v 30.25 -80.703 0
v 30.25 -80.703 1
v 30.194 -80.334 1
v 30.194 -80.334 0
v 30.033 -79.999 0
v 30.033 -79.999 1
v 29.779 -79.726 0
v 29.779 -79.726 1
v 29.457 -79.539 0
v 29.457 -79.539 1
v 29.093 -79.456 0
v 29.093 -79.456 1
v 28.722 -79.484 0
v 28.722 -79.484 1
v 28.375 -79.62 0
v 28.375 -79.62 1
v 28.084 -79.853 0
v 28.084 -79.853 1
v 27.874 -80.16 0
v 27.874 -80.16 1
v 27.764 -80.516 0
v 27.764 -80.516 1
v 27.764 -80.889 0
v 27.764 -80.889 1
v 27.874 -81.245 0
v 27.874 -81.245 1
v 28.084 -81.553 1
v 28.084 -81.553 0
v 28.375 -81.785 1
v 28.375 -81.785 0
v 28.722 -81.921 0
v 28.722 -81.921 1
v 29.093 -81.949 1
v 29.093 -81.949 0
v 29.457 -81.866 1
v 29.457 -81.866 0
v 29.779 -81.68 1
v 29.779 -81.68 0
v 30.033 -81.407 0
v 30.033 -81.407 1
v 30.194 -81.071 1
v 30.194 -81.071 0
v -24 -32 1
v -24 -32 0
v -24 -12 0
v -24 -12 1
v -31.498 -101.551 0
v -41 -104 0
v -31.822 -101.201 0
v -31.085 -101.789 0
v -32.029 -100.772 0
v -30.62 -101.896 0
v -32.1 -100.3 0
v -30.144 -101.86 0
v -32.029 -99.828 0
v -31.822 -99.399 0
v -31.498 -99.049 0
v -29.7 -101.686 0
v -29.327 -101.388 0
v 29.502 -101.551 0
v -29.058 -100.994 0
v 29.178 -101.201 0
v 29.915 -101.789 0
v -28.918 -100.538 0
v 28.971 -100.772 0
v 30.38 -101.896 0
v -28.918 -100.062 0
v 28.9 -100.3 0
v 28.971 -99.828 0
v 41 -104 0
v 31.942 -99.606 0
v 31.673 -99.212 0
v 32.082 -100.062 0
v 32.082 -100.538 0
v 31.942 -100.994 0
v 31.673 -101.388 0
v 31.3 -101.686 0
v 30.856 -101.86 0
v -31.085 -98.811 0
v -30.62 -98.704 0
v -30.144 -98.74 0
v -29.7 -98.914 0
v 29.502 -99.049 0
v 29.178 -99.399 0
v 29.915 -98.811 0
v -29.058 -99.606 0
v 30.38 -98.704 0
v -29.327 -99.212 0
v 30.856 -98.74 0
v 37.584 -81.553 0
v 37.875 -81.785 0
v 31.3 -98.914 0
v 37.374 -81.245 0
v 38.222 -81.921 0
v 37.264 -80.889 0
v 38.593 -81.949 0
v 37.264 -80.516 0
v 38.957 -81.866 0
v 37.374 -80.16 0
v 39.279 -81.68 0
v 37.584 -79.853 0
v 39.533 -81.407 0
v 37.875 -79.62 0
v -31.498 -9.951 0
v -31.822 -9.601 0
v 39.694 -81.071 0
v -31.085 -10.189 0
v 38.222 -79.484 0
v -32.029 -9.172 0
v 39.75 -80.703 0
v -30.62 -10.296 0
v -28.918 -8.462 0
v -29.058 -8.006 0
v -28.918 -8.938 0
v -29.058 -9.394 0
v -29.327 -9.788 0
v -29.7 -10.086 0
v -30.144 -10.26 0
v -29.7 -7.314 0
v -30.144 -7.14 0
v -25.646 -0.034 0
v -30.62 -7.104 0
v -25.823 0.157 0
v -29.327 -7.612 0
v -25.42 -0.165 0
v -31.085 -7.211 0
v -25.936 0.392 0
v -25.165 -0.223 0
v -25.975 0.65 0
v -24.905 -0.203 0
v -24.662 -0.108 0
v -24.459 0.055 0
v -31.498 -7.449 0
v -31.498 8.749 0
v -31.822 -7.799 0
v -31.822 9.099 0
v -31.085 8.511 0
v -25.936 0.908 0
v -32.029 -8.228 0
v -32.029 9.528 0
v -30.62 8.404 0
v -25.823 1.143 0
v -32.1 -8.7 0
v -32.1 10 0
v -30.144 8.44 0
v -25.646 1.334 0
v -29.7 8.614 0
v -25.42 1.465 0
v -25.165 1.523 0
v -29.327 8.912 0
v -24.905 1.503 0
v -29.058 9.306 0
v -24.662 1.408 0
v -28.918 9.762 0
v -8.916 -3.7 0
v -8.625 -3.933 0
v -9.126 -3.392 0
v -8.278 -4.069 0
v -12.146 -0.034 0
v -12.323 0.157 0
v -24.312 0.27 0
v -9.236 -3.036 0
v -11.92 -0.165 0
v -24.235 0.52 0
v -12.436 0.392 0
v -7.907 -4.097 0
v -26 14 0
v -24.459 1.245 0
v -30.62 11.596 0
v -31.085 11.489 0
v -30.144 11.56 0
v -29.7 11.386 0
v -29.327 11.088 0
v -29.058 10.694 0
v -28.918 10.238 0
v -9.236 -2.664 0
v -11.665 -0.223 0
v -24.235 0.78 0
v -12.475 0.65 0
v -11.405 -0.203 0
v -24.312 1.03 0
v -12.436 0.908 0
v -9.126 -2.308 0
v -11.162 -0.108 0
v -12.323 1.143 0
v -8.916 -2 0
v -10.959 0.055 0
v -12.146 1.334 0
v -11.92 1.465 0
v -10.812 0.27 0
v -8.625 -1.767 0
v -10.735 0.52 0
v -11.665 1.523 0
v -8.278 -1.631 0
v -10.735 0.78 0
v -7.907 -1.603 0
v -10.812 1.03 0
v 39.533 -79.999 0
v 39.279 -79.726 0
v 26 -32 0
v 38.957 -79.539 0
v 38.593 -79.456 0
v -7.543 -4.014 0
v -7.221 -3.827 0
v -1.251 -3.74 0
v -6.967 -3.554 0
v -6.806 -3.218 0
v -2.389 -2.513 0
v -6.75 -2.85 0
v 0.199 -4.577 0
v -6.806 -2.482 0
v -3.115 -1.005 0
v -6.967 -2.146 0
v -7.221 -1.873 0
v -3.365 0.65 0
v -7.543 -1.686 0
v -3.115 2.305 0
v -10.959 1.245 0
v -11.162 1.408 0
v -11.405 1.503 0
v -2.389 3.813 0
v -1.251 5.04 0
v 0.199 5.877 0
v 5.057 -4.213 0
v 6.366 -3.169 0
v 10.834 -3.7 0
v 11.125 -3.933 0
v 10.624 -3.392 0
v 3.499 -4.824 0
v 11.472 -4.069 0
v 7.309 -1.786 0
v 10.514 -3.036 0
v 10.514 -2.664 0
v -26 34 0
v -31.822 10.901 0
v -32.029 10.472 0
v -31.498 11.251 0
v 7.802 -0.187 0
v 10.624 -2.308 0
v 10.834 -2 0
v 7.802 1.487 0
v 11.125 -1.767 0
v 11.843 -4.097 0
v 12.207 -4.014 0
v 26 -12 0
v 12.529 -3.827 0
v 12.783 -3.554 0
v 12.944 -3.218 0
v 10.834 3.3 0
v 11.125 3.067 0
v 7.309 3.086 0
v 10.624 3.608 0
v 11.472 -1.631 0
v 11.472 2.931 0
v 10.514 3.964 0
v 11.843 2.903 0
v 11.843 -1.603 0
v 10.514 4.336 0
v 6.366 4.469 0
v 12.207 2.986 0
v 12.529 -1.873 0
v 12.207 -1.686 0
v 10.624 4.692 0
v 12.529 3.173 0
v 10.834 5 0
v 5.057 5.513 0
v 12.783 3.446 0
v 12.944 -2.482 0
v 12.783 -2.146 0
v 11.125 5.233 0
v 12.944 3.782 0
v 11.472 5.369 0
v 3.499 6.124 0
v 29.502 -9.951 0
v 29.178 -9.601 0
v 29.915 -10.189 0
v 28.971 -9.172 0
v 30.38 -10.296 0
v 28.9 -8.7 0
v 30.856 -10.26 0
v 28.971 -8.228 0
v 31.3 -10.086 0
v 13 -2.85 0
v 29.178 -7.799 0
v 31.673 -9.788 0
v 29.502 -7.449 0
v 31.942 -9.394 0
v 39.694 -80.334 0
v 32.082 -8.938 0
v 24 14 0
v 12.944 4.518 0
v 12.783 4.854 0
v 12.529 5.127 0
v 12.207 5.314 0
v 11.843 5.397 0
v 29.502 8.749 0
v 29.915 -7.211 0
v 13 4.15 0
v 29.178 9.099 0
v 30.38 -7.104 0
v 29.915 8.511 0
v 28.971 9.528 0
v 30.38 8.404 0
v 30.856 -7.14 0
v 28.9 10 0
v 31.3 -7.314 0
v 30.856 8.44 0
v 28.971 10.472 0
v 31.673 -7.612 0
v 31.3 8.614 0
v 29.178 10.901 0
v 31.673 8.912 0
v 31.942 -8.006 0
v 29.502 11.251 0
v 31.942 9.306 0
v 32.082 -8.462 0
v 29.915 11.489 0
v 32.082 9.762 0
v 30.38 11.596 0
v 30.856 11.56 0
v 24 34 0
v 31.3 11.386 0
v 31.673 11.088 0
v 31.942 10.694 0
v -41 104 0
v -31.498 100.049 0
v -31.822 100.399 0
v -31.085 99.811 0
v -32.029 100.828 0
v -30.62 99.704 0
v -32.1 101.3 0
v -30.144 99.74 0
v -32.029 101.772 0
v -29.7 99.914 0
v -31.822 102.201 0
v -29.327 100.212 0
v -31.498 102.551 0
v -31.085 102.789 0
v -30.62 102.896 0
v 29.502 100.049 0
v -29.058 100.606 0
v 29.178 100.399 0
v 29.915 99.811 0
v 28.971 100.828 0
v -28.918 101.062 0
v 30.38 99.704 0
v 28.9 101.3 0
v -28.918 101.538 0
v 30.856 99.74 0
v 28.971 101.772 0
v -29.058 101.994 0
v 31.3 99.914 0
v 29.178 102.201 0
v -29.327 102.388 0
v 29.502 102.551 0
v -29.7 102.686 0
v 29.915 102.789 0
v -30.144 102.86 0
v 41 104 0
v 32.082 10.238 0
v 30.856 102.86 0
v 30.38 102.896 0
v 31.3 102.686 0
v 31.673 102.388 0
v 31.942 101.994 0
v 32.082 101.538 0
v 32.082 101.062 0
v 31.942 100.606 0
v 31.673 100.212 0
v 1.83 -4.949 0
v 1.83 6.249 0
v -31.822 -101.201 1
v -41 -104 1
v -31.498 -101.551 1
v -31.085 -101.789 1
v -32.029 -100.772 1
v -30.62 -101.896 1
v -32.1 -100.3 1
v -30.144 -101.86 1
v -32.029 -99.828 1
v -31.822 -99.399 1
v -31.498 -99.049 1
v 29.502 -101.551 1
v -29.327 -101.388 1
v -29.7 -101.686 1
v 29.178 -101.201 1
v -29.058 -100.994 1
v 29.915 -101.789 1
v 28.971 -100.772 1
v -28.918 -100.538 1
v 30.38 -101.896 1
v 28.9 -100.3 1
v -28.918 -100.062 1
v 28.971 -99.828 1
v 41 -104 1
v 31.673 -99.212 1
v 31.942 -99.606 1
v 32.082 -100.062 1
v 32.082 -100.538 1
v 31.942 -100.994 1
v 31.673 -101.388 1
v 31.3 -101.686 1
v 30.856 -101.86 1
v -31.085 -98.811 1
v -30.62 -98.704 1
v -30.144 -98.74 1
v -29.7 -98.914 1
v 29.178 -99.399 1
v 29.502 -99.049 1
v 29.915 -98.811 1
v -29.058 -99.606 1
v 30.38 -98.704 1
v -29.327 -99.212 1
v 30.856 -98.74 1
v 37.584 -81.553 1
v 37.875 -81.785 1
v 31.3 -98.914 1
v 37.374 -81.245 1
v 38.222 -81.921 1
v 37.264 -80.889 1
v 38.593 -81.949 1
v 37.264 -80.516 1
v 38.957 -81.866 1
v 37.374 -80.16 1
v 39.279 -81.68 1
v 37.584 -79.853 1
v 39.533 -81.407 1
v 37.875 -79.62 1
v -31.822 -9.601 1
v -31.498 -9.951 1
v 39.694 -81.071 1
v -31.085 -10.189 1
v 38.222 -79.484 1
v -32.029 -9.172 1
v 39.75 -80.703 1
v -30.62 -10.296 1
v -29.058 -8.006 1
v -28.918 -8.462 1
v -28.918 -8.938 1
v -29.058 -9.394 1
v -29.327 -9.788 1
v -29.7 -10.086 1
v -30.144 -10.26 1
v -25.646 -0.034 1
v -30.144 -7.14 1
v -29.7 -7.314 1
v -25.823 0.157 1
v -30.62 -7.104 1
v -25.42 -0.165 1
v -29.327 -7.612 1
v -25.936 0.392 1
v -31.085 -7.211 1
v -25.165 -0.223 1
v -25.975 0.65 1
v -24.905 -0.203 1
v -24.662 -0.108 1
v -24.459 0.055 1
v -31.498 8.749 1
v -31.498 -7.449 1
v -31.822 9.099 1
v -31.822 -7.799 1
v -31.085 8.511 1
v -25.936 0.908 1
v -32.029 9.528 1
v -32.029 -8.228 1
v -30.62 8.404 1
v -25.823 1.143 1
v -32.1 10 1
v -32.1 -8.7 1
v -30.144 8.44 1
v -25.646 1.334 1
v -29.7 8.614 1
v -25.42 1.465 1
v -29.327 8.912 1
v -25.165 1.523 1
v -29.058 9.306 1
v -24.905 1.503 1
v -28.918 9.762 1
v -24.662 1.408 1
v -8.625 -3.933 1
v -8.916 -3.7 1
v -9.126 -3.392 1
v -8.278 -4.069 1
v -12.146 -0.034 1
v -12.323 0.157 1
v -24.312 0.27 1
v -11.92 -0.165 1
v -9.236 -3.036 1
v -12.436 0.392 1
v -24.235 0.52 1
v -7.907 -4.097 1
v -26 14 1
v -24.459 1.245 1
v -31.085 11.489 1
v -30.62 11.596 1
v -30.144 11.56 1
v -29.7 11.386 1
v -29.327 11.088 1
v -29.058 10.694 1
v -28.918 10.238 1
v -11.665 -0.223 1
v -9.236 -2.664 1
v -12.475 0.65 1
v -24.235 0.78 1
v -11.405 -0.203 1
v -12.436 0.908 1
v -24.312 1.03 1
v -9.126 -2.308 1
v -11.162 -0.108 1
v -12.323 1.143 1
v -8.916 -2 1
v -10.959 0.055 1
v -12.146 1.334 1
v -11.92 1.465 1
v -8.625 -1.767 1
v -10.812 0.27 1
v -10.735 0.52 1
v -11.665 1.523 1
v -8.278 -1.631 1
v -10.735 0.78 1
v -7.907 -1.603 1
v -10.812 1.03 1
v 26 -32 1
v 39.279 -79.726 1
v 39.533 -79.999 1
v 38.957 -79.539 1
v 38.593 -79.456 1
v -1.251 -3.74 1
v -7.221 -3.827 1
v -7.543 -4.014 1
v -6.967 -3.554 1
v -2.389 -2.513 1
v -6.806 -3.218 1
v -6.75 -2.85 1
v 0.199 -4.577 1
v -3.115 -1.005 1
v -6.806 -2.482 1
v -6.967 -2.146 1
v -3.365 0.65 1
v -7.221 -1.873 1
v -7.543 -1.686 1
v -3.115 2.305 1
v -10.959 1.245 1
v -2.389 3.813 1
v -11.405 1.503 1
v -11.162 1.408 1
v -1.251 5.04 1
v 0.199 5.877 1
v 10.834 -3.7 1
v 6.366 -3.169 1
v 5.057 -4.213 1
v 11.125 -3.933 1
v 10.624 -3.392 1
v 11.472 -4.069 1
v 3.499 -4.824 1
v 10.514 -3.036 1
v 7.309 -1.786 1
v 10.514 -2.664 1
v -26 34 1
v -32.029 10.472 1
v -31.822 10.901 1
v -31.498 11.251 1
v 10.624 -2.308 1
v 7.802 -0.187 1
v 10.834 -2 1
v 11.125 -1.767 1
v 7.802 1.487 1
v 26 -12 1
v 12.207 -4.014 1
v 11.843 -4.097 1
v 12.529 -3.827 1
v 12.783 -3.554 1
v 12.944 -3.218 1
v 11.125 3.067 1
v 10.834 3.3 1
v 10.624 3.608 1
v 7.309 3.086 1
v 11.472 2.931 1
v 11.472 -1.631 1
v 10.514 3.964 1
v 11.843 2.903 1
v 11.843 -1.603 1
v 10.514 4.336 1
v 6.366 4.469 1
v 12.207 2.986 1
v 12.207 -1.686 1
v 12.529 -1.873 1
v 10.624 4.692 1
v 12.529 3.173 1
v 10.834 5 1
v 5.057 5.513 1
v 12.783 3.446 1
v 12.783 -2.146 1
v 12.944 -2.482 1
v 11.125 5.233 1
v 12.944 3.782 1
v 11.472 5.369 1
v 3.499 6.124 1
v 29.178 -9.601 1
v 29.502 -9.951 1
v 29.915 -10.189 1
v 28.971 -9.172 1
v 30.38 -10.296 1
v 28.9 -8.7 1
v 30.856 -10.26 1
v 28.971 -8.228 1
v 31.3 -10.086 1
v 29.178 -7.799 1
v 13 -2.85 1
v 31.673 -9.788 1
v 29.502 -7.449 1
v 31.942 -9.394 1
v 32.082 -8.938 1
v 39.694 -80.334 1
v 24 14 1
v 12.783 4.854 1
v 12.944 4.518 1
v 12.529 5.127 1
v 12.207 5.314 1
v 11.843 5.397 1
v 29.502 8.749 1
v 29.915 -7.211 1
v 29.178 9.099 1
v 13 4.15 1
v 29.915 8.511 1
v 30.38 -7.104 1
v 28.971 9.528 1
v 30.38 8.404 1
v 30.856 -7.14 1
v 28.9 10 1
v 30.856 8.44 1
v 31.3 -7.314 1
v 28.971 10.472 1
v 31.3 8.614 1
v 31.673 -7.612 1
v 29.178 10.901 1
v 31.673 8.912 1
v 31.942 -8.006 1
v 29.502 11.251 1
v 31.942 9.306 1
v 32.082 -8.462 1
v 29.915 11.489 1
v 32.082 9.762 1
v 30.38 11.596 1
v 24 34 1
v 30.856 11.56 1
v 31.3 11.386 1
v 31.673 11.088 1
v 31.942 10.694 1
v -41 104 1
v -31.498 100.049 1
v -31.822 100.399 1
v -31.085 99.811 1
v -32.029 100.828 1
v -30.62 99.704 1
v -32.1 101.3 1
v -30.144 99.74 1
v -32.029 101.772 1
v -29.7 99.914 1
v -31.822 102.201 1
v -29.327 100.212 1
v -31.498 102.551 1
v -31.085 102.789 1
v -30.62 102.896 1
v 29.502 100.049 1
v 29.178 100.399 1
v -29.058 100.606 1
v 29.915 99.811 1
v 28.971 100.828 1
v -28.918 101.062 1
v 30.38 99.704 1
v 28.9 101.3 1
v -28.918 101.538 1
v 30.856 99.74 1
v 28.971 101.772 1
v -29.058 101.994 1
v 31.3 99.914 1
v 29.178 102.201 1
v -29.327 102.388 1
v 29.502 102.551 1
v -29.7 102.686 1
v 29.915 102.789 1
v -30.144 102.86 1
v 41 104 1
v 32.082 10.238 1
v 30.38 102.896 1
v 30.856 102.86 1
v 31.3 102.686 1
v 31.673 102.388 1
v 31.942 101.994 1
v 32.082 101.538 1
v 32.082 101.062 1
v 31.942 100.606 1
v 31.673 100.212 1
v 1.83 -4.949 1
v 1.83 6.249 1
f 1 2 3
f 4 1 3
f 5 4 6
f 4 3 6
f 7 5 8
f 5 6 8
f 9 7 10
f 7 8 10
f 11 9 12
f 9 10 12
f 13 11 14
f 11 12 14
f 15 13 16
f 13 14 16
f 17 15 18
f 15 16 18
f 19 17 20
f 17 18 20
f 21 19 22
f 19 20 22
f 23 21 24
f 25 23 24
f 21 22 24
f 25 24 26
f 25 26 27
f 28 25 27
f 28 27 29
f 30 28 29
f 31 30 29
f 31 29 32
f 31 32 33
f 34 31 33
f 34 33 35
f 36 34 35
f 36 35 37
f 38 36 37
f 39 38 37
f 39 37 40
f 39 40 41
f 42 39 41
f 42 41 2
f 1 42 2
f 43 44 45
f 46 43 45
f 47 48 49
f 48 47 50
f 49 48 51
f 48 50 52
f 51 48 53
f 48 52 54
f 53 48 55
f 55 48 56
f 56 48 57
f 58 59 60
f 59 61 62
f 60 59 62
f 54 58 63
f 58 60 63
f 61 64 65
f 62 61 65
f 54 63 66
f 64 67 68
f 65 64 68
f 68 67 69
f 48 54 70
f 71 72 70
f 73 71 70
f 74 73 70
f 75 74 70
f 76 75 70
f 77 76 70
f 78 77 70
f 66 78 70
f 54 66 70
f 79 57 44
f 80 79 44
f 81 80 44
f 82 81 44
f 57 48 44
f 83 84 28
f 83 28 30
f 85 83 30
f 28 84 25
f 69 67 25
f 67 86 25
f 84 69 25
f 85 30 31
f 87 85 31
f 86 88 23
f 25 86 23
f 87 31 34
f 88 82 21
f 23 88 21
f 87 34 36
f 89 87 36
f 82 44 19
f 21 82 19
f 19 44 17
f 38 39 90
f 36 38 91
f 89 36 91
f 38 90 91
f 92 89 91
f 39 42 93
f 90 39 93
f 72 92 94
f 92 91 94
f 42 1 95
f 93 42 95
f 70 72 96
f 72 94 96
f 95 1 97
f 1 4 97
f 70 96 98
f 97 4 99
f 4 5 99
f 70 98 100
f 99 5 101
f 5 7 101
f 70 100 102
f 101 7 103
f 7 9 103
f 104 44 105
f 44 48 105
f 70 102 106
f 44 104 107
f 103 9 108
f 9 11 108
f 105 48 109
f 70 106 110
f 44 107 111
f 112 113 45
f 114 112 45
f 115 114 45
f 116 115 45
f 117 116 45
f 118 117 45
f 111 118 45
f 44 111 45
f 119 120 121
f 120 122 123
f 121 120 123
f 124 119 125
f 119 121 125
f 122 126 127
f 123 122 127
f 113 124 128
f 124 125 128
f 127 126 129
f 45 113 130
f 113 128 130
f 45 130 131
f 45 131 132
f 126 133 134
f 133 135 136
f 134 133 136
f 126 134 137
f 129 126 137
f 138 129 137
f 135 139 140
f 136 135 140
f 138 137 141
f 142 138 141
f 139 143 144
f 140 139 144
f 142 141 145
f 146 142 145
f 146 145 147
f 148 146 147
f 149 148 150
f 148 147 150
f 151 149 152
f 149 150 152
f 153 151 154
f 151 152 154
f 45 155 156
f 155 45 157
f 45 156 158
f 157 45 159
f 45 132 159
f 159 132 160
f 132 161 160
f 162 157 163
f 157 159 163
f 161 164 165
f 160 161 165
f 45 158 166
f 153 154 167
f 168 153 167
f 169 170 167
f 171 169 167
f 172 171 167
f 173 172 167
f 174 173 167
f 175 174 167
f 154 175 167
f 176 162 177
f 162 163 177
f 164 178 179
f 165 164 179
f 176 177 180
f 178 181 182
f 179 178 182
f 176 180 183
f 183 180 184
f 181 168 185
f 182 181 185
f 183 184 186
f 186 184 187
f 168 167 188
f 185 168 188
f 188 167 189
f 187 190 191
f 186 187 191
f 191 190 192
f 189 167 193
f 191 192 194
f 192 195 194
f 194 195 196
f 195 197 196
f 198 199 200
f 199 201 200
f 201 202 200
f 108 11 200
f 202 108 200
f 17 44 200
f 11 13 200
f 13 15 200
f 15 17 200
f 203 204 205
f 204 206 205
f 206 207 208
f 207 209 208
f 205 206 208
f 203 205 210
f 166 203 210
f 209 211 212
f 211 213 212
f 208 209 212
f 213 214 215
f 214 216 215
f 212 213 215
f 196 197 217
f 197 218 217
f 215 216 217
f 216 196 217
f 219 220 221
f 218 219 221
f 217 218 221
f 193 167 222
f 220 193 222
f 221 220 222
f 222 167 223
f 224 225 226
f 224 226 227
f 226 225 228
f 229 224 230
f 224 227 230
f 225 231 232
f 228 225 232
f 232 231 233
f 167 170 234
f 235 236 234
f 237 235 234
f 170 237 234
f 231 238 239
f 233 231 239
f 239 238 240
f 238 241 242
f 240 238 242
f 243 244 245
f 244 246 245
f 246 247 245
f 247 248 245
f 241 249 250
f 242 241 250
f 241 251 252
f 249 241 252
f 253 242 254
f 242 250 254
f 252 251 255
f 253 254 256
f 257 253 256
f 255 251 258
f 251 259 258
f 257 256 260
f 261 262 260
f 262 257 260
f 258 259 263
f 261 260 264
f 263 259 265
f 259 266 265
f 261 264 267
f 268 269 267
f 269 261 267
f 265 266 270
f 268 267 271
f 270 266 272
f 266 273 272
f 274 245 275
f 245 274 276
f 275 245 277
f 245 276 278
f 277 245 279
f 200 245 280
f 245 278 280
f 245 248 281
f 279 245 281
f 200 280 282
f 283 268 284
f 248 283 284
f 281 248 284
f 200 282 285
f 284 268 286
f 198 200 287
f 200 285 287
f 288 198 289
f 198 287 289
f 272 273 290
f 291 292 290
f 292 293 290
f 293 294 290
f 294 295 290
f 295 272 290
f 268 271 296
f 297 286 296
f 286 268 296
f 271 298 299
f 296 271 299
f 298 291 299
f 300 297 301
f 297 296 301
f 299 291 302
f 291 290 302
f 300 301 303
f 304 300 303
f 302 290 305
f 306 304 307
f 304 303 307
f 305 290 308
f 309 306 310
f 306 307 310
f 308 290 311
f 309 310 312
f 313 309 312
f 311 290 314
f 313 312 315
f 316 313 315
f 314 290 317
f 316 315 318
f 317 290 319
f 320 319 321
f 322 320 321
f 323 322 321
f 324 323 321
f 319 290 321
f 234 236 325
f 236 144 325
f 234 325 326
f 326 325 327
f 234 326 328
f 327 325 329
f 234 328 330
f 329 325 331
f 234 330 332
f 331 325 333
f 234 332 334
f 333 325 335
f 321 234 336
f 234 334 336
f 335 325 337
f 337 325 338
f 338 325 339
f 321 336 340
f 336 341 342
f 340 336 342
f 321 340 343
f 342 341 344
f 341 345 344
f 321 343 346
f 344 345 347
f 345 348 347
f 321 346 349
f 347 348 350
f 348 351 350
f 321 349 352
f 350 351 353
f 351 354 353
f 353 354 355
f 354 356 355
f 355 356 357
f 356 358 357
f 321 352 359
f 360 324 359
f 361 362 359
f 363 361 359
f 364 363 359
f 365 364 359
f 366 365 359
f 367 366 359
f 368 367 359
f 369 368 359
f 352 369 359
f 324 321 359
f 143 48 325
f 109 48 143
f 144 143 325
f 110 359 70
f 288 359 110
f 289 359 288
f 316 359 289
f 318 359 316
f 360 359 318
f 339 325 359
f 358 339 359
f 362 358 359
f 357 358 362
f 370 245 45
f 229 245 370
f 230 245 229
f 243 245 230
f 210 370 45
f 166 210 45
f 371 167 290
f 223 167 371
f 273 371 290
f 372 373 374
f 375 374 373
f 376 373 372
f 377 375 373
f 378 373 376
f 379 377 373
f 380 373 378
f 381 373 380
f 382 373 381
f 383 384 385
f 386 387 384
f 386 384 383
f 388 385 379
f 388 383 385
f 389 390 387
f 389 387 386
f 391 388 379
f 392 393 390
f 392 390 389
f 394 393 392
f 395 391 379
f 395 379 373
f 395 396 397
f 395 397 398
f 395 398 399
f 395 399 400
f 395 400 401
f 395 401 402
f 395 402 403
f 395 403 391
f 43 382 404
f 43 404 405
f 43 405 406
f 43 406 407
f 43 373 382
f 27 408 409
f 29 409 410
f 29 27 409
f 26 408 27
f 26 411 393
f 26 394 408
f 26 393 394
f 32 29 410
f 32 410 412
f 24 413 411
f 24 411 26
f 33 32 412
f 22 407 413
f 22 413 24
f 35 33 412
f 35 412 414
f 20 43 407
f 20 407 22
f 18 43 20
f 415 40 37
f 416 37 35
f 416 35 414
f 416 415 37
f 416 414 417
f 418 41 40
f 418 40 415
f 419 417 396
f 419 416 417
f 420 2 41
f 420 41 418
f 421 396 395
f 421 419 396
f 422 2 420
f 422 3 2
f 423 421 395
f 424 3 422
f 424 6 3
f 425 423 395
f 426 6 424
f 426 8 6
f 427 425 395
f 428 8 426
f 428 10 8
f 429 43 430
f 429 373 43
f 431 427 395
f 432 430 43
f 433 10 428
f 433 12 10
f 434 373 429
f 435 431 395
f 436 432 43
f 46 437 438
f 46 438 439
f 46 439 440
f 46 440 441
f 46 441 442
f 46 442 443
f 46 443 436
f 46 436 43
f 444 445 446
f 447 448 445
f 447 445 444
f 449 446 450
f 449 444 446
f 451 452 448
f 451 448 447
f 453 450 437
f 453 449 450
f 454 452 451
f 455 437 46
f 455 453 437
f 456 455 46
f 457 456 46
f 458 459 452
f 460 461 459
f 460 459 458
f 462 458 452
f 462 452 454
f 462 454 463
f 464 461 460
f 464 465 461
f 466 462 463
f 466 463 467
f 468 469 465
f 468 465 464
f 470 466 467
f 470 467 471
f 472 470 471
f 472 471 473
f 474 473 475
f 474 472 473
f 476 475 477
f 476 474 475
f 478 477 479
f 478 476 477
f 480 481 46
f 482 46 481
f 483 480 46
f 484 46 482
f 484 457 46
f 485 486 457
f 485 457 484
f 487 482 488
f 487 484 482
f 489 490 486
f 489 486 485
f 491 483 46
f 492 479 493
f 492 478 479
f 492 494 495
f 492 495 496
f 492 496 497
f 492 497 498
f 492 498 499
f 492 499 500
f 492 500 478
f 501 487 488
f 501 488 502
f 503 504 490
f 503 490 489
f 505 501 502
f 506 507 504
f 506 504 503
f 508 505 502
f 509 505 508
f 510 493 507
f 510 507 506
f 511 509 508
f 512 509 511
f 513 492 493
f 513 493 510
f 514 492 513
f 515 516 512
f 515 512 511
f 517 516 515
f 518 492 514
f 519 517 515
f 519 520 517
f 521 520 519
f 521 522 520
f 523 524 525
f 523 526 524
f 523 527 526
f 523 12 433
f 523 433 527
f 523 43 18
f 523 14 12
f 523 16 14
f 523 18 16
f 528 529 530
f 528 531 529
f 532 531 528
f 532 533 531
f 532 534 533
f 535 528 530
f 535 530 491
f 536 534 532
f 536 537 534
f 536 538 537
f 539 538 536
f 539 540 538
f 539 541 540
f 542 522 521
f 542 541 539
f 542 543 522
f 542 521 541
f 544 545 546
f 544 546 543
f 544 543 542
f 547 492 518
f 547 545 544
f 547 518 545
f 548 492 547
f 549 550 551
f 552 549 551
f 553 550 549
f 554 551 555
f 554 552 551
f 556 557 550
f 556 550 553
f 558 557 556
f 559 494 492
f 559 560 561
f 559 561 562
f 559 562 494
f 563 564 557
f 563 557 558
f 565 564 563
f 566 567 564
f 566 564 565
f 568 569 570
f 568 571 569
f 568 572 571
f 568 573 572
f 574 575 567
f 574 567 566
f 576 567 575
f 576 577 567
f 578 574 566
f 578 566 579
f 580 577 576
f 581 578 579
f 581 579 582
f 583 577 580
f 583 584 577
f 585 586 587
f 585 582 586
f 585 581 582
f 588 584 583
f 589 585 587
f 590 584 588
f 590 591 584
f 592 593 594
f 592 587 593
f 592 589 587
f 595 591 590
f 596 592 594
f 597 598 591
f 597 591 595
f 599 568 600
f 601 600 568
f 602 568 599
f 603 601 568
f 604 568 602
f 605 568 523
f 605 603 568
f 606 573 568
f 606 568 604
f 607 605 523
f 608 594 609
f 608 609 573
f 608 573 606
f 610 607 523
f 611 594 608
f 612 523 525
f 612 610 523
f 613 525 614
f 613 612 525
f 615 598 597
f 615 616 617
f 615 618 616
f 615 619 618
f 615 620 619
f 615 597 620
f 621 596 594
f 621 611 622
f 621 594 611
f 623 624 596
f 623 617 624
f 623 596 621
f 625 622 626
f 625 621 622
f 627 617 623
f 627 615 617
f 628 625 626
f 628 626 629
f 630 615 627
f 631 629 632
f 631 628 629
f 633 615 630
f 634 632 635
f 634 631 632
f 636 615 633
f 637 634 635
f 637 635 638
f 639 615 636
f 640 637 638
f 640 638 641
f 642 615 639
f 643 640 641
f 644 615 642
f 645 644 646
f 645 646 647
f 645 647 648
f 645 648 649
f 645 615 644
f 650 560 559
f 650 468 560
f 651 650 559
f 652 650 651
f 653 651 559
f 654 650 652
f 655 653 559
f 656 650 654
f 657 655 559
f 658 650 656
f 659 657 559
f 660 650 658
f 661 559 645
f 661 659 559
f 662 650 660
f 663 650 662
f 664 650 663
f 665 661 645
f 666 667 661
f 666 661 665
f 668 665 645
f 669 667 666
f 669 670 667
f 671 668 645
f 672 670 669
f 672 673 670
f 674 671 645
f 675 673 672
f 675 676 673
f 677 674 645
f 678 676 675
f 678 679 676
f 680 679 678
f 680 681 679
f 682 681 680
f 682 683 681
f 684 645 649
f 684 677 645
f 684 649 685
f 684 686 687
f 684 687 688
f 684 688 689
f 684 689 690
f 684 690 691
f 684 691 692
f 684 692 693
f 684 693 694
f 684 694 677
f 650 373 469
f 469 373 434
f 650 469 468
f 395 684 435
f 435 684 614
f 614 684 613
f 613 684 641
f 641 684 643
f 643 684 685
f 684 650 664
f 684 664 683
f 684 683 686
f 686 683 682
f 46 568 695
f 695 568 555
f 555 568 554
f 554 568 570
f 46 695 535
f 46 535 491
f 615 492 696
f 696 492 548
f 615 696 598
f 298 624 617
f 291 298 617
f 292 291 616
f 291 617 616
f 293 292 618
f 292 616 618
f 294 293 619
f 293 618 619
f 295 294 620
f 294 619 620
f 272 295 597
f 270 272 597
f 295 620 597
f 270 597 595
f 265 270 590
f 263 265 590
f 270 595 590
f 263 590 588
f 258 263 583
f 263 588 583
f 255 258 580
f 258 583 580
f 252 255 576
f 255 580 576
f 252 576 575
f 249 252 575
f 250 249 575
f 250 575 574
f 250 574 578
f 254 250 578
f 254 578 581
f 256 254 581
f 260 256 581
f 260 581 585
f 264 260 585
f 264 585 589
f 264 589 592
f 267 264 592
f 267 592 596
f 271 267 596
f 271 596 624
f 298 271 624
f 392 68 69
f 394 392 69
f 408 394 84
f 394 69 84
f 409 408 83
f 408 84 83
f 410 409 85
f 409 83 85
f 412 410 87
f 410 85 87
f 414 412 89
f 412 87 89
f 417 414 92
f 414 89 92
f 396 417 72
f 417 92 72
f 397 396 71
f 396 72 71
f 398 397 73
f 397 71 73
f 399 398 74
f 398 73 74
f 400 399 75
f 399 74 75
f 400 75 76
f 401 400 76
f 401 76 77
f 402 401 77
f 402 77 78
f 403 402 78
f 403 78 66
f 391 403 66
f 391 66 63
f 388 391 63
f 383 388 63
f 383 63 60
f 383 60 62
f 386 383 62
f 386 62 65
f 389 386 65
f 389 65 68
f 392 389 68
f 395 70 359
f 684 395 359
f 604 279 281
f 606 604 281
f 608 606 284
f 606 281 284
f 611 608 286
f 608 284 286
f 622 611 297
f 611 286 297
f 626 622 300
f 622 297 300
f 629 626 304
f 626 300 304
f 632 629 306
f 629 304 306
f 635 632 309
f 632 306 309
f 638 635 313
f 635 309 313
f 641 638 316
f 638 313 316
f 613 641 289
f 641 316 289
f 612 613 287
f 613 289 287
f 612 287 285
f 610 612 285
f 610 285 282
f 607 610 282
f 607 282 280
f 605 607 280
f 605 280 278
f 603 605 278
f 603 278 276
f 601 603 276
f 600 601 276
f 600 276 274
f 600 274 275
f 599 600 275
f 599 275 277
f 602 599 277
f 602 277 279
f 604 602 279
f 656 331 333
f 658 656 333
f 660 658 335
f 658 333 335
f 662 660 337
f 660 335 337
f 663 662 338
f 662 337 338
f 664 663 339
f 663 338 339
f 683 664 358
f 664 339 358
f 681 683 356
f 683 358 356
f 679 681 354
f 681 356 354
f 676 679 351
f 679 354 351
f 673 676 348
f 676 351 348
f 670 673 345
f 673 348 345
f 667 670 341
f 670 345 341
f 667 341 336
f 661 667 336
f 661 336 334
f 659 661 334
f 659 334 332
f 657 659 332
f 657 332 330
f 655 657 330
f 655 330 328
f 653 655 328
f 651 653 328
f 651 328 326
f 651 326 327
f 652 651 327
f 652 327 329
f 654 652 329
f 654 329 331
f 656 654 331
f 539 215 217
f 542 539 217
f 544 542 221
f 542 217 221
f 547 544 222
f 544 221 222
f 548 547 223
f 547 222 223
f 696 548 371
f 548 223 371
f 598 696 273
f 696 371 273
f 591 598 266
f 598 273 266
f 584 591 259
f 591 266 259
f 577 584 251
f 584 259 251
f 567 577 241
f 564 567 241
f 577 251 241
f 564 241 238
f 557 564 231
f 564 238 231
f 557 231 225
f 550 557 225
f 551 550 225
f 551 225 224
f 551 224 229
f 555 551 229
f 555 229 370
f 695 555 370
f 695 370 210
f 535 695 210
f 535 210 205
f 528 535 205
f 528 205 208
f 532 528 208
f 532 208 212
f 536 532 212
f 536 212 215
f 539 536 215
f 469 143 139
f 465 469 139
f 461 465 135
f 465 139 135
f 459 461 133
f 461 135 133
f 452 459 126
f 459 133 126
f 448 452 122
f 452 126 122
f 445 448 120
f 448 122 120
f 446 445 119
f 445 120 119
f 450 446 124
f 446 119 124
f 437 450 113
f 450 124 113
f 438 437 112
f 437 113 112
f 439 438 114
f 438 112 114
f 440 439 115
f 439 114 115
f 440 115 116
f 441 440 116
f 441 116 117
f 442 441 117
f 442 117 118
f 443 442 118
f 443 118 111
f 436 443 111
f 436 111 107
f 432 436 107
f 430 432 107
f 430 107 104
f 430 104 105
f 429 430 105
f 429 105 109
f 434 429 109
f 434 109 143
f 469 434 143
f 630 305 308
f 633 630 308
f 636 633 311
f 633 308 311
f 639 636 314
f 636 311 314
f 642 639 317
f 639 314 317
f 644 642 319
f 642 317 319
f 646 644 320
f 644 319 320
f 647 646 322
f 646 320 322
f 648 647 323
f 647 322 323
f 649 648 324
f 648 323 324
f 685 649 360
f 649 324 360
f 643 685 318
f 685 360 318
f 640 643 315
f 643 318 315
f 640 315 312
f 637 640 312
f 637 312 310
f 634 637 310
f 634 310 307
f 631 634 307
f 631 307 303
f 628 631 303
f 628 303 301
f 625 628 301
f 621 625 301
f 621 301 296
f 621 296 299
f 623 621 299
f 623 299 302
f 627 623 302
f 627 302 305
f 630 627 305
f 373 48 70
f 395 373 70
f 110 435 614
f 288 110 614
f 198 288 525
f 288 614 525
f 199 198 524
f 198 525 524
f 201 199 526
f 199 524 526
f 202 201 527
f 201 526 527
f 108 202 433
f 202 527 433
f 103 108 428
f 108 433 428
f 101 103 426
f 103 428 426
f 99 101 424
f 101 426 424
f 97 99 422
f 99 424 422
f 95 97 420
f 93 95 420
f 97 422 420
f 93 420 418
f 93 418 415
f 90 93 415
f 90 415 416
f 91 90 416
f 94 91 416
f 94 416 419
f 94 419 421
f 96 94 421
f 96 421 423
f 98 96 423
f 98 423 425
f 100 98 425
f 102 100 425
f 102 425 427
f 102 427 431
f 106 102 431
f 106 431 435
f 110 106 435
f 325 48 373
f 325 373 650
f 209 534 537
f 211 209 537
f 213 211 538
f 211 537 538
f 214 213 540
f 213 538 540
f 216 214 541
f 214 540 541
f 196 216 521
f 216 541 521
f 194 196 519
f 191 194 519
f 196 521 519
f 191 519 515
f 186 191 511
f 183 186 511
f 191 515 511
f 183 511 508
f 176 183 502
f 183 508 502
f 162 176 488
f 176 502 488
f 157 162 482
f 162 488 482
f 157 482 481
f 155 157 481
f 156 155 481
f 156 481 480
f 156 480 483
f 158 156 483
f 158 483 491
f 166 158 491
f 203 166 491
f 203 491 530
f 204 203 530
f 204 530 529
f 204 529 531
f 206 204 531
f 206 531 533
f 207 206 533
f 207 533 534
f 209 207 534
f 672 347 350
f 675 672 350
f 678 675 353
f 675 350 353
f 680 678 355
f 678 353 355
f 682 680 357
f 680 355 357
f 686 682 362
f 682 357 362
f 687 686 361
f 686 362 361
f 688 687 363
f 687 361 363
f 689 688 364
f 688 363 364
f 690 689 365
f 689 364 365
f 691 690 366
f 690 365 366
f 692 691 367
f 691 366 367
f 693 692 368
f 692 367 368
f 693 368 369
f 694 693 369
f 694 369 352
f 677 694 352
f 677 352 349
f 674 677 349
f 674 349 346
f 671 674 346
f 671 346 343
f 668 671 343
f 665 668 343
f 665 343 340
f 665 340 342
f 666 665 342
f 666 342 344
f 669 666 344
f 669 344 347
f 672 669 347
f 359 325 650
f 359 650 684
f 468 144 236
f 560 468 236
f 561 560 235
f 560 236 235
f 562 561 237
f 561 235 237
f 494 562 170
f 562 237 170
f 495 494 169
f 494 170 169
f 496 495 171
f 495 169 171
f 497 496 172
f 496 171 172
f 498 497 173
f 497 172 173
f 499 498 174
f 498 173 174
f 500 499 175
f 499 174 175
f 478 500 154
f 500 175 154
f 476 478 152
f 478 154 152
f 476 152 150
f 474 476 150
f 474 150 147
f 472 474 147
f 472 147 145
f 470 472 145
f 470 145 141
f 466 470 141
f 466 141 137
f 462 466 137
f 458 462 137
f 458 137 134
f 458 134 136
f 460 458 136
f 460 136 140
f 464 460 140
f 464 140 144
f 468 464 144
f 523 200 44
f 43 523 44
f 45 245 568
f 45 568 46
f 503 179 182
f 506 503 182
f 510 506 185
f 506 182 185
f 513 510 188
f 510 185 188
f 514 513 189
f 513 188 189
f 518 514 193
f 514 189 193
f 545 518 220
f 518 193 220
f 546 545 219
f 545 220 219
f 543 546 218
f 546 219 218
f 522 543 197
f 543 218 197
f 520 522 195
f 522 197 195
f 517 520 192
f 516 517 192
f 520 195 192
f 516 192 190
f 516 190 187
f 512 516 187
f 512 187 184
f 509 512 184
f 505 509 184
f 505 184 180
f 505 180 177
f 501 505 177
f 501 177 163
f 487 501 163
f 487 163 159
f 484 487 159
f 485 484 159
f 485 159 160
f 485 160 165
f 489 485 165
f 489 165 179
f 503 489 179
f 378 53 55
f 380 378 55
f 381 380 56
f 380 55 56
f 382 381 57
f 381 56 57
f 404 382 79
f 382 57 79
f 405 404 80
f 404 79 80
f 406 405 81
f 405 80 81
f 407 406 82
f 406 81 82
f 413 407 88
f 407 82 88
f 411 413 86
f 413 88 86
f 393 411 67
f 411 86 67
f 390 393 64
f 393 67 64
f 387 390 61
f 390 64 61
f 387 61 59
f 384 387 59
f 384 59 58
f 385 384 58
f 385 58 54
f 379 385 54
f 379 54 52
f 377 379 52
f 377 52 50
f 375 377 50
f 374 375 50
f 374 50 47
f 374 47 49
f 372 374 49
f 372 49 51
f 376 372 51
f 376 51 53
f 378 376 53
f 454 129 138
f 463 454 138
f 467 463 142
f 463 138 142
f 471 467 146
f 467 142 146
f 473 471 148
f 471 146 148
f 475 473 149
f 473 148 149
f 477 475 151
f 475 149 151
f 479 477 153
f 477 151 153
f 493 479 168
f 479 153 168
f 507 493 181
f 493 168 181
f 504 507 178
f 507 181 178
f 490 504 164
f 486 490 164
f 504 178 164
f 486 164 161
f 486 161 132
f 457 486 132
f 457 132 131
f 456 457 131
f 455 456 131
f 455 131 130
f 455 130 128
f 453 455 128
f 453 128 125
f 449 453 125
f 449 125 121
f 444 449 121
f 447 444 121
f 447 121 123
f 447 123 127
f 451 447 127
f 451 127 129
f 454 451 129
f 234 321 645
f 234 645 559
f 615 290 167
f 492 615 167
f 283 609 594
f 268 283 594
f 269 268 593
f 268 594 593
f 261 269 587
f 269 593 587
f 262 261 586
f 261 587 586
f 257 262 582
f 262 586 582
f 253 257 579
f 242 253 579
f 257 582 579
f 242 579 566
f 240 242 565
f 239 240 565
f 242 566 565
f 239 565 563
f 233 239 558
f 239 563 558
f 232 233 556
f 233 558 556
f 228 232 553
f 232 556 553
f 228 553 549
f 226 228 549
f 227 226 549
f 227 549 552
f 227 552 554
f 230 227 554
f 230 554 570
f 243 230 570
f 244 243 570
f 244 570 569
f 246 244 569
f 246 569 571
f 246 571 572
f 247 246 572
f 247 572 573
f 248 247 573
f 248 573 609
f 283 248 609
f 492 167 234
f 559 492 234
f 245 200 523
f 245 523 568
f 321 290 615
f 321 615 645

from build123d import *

# Parameters (mm, degrees)
SKETCH1_W                      = 82
SKETCH1_H                      = 208
BOSS_EXTRUDE1_DEPTH            = 1
F_3_2_3_2_DIAMETER_HOLE1_D     = 3.2
F_3_2_3_2_DIAMETER_HOLE1_DEPTH = 1
SKETCH7_W                      = 50
SKETCH7_H                      = 20
CUT_EXTRUDE2_DEPTH             = 10
F_2_5_2_5_DIAMETER_HOLE1_D     = 2.5
F_1_75_1_75_DIAMETER_HOLE1_D   = 1.75
SKETCH12_R                     = 1.25
CUT_EXTRUDE3_DEPTH             = 10
SKETCH13_R                     = 5.614838764
CUT_EXTRUDE4_DEPTH             = 10


with BuildPart() as part:
    # Sketch1 → Boss-Extrude1 (new body)
    with BuildSketch(Plane.XY):
        Rectangle(SKETCH1_W, SKETCH1_H)
    extrude(amount=BOSS_EXTRUDE1_DEPTH)

    # Ø3.2 (3.2) Diameter Hole1
    with Locations(Plane.XY.offset(1)):
        with Locations((-30.5, 10), (30.5, 10), (30.49999746, -100.29999968), (-30.50000246, -100.29999968), (-30.5, 101.3), (30.5, 101.3), (30.49999746, -8.7), (30.644996947, -118.559802529), (-30.50000246, -8.7)):
            Hole(F_3_2_3_2_DIAMETER_HOLE1_D / 2, depth=F_3_2_3_2_DIAMETER_HOLE1_DEPTH)

    # Sketch7 → Cut-Extrude2 (cut)
    with BuildSketch(Plane(origin=(0, 0, 0), x_dir=(-1, 0, 0), z_dir=(0, 0, -1))):
        with Locations((-1, -22)):
            Rectangle(SKETCH7_W, SKETCH7_H)
        with Locations((1, 24)):
            Rectangle(SKETCH7_W, SKETCH7_H)
    extrude(amount=-CUT_EXTRUDE2_DEPTH, mode=Mode.SUBTRACT)

    # Ø2.5 (2.5) Diameter Hole1 (through all)
    with Locations(Plane(origin=(0, 0, 0), x_dir=(-1, 0, 0), z_dir=(0, 0, -1))):
        with Locations((-29, -80.702796173), (-38.5, -80.702796173)):
            Hole(F_2_5_2_5_DIAMETER_HOLE1_D / 2)

    # Ø1.75 (1.75) Diameter Hole1 (through all)
    with Locations(Plane.XY.offset(1)):
        with Locations((-25.1, 0.65), (-11.6, 0.65)):
            Hole(F_1_75_1_75_DIAMETER_HOLE1_D / 2)

    # Sketch12 → Cut-Extrude3 (cut)
    with BuildSketch(Plane.XY.offset(1)):
        with Locations((-8, -2.84999878)):
            Circle(SKETCH12_R)
        with Locations((11.75, -2.84999878)):
            Circle(SKETCH12_R)
        with Locations((11.75, 4.15000122)):
            Circle(SKETCH12_R)
    extrude(amount=-CUT_EXTRUDE3_DEPTH, mode=Mode.SUBTRACT)

    # Sketch13 → Cut-Extrude4 (cut)
    with BuildSketch(Plane(origin=(0, 0, 0), x_dir=(-1, 0, 0), z_dir=(0, 0, -1))):
        with Locations((-2.25, 0.65000122)):
            Circle(SKETCH13_R)
    extrude(amount=-CUT_EXTRUDE4_DEPTH, mode=Mode.SUBTRACT)


solid = part.part
